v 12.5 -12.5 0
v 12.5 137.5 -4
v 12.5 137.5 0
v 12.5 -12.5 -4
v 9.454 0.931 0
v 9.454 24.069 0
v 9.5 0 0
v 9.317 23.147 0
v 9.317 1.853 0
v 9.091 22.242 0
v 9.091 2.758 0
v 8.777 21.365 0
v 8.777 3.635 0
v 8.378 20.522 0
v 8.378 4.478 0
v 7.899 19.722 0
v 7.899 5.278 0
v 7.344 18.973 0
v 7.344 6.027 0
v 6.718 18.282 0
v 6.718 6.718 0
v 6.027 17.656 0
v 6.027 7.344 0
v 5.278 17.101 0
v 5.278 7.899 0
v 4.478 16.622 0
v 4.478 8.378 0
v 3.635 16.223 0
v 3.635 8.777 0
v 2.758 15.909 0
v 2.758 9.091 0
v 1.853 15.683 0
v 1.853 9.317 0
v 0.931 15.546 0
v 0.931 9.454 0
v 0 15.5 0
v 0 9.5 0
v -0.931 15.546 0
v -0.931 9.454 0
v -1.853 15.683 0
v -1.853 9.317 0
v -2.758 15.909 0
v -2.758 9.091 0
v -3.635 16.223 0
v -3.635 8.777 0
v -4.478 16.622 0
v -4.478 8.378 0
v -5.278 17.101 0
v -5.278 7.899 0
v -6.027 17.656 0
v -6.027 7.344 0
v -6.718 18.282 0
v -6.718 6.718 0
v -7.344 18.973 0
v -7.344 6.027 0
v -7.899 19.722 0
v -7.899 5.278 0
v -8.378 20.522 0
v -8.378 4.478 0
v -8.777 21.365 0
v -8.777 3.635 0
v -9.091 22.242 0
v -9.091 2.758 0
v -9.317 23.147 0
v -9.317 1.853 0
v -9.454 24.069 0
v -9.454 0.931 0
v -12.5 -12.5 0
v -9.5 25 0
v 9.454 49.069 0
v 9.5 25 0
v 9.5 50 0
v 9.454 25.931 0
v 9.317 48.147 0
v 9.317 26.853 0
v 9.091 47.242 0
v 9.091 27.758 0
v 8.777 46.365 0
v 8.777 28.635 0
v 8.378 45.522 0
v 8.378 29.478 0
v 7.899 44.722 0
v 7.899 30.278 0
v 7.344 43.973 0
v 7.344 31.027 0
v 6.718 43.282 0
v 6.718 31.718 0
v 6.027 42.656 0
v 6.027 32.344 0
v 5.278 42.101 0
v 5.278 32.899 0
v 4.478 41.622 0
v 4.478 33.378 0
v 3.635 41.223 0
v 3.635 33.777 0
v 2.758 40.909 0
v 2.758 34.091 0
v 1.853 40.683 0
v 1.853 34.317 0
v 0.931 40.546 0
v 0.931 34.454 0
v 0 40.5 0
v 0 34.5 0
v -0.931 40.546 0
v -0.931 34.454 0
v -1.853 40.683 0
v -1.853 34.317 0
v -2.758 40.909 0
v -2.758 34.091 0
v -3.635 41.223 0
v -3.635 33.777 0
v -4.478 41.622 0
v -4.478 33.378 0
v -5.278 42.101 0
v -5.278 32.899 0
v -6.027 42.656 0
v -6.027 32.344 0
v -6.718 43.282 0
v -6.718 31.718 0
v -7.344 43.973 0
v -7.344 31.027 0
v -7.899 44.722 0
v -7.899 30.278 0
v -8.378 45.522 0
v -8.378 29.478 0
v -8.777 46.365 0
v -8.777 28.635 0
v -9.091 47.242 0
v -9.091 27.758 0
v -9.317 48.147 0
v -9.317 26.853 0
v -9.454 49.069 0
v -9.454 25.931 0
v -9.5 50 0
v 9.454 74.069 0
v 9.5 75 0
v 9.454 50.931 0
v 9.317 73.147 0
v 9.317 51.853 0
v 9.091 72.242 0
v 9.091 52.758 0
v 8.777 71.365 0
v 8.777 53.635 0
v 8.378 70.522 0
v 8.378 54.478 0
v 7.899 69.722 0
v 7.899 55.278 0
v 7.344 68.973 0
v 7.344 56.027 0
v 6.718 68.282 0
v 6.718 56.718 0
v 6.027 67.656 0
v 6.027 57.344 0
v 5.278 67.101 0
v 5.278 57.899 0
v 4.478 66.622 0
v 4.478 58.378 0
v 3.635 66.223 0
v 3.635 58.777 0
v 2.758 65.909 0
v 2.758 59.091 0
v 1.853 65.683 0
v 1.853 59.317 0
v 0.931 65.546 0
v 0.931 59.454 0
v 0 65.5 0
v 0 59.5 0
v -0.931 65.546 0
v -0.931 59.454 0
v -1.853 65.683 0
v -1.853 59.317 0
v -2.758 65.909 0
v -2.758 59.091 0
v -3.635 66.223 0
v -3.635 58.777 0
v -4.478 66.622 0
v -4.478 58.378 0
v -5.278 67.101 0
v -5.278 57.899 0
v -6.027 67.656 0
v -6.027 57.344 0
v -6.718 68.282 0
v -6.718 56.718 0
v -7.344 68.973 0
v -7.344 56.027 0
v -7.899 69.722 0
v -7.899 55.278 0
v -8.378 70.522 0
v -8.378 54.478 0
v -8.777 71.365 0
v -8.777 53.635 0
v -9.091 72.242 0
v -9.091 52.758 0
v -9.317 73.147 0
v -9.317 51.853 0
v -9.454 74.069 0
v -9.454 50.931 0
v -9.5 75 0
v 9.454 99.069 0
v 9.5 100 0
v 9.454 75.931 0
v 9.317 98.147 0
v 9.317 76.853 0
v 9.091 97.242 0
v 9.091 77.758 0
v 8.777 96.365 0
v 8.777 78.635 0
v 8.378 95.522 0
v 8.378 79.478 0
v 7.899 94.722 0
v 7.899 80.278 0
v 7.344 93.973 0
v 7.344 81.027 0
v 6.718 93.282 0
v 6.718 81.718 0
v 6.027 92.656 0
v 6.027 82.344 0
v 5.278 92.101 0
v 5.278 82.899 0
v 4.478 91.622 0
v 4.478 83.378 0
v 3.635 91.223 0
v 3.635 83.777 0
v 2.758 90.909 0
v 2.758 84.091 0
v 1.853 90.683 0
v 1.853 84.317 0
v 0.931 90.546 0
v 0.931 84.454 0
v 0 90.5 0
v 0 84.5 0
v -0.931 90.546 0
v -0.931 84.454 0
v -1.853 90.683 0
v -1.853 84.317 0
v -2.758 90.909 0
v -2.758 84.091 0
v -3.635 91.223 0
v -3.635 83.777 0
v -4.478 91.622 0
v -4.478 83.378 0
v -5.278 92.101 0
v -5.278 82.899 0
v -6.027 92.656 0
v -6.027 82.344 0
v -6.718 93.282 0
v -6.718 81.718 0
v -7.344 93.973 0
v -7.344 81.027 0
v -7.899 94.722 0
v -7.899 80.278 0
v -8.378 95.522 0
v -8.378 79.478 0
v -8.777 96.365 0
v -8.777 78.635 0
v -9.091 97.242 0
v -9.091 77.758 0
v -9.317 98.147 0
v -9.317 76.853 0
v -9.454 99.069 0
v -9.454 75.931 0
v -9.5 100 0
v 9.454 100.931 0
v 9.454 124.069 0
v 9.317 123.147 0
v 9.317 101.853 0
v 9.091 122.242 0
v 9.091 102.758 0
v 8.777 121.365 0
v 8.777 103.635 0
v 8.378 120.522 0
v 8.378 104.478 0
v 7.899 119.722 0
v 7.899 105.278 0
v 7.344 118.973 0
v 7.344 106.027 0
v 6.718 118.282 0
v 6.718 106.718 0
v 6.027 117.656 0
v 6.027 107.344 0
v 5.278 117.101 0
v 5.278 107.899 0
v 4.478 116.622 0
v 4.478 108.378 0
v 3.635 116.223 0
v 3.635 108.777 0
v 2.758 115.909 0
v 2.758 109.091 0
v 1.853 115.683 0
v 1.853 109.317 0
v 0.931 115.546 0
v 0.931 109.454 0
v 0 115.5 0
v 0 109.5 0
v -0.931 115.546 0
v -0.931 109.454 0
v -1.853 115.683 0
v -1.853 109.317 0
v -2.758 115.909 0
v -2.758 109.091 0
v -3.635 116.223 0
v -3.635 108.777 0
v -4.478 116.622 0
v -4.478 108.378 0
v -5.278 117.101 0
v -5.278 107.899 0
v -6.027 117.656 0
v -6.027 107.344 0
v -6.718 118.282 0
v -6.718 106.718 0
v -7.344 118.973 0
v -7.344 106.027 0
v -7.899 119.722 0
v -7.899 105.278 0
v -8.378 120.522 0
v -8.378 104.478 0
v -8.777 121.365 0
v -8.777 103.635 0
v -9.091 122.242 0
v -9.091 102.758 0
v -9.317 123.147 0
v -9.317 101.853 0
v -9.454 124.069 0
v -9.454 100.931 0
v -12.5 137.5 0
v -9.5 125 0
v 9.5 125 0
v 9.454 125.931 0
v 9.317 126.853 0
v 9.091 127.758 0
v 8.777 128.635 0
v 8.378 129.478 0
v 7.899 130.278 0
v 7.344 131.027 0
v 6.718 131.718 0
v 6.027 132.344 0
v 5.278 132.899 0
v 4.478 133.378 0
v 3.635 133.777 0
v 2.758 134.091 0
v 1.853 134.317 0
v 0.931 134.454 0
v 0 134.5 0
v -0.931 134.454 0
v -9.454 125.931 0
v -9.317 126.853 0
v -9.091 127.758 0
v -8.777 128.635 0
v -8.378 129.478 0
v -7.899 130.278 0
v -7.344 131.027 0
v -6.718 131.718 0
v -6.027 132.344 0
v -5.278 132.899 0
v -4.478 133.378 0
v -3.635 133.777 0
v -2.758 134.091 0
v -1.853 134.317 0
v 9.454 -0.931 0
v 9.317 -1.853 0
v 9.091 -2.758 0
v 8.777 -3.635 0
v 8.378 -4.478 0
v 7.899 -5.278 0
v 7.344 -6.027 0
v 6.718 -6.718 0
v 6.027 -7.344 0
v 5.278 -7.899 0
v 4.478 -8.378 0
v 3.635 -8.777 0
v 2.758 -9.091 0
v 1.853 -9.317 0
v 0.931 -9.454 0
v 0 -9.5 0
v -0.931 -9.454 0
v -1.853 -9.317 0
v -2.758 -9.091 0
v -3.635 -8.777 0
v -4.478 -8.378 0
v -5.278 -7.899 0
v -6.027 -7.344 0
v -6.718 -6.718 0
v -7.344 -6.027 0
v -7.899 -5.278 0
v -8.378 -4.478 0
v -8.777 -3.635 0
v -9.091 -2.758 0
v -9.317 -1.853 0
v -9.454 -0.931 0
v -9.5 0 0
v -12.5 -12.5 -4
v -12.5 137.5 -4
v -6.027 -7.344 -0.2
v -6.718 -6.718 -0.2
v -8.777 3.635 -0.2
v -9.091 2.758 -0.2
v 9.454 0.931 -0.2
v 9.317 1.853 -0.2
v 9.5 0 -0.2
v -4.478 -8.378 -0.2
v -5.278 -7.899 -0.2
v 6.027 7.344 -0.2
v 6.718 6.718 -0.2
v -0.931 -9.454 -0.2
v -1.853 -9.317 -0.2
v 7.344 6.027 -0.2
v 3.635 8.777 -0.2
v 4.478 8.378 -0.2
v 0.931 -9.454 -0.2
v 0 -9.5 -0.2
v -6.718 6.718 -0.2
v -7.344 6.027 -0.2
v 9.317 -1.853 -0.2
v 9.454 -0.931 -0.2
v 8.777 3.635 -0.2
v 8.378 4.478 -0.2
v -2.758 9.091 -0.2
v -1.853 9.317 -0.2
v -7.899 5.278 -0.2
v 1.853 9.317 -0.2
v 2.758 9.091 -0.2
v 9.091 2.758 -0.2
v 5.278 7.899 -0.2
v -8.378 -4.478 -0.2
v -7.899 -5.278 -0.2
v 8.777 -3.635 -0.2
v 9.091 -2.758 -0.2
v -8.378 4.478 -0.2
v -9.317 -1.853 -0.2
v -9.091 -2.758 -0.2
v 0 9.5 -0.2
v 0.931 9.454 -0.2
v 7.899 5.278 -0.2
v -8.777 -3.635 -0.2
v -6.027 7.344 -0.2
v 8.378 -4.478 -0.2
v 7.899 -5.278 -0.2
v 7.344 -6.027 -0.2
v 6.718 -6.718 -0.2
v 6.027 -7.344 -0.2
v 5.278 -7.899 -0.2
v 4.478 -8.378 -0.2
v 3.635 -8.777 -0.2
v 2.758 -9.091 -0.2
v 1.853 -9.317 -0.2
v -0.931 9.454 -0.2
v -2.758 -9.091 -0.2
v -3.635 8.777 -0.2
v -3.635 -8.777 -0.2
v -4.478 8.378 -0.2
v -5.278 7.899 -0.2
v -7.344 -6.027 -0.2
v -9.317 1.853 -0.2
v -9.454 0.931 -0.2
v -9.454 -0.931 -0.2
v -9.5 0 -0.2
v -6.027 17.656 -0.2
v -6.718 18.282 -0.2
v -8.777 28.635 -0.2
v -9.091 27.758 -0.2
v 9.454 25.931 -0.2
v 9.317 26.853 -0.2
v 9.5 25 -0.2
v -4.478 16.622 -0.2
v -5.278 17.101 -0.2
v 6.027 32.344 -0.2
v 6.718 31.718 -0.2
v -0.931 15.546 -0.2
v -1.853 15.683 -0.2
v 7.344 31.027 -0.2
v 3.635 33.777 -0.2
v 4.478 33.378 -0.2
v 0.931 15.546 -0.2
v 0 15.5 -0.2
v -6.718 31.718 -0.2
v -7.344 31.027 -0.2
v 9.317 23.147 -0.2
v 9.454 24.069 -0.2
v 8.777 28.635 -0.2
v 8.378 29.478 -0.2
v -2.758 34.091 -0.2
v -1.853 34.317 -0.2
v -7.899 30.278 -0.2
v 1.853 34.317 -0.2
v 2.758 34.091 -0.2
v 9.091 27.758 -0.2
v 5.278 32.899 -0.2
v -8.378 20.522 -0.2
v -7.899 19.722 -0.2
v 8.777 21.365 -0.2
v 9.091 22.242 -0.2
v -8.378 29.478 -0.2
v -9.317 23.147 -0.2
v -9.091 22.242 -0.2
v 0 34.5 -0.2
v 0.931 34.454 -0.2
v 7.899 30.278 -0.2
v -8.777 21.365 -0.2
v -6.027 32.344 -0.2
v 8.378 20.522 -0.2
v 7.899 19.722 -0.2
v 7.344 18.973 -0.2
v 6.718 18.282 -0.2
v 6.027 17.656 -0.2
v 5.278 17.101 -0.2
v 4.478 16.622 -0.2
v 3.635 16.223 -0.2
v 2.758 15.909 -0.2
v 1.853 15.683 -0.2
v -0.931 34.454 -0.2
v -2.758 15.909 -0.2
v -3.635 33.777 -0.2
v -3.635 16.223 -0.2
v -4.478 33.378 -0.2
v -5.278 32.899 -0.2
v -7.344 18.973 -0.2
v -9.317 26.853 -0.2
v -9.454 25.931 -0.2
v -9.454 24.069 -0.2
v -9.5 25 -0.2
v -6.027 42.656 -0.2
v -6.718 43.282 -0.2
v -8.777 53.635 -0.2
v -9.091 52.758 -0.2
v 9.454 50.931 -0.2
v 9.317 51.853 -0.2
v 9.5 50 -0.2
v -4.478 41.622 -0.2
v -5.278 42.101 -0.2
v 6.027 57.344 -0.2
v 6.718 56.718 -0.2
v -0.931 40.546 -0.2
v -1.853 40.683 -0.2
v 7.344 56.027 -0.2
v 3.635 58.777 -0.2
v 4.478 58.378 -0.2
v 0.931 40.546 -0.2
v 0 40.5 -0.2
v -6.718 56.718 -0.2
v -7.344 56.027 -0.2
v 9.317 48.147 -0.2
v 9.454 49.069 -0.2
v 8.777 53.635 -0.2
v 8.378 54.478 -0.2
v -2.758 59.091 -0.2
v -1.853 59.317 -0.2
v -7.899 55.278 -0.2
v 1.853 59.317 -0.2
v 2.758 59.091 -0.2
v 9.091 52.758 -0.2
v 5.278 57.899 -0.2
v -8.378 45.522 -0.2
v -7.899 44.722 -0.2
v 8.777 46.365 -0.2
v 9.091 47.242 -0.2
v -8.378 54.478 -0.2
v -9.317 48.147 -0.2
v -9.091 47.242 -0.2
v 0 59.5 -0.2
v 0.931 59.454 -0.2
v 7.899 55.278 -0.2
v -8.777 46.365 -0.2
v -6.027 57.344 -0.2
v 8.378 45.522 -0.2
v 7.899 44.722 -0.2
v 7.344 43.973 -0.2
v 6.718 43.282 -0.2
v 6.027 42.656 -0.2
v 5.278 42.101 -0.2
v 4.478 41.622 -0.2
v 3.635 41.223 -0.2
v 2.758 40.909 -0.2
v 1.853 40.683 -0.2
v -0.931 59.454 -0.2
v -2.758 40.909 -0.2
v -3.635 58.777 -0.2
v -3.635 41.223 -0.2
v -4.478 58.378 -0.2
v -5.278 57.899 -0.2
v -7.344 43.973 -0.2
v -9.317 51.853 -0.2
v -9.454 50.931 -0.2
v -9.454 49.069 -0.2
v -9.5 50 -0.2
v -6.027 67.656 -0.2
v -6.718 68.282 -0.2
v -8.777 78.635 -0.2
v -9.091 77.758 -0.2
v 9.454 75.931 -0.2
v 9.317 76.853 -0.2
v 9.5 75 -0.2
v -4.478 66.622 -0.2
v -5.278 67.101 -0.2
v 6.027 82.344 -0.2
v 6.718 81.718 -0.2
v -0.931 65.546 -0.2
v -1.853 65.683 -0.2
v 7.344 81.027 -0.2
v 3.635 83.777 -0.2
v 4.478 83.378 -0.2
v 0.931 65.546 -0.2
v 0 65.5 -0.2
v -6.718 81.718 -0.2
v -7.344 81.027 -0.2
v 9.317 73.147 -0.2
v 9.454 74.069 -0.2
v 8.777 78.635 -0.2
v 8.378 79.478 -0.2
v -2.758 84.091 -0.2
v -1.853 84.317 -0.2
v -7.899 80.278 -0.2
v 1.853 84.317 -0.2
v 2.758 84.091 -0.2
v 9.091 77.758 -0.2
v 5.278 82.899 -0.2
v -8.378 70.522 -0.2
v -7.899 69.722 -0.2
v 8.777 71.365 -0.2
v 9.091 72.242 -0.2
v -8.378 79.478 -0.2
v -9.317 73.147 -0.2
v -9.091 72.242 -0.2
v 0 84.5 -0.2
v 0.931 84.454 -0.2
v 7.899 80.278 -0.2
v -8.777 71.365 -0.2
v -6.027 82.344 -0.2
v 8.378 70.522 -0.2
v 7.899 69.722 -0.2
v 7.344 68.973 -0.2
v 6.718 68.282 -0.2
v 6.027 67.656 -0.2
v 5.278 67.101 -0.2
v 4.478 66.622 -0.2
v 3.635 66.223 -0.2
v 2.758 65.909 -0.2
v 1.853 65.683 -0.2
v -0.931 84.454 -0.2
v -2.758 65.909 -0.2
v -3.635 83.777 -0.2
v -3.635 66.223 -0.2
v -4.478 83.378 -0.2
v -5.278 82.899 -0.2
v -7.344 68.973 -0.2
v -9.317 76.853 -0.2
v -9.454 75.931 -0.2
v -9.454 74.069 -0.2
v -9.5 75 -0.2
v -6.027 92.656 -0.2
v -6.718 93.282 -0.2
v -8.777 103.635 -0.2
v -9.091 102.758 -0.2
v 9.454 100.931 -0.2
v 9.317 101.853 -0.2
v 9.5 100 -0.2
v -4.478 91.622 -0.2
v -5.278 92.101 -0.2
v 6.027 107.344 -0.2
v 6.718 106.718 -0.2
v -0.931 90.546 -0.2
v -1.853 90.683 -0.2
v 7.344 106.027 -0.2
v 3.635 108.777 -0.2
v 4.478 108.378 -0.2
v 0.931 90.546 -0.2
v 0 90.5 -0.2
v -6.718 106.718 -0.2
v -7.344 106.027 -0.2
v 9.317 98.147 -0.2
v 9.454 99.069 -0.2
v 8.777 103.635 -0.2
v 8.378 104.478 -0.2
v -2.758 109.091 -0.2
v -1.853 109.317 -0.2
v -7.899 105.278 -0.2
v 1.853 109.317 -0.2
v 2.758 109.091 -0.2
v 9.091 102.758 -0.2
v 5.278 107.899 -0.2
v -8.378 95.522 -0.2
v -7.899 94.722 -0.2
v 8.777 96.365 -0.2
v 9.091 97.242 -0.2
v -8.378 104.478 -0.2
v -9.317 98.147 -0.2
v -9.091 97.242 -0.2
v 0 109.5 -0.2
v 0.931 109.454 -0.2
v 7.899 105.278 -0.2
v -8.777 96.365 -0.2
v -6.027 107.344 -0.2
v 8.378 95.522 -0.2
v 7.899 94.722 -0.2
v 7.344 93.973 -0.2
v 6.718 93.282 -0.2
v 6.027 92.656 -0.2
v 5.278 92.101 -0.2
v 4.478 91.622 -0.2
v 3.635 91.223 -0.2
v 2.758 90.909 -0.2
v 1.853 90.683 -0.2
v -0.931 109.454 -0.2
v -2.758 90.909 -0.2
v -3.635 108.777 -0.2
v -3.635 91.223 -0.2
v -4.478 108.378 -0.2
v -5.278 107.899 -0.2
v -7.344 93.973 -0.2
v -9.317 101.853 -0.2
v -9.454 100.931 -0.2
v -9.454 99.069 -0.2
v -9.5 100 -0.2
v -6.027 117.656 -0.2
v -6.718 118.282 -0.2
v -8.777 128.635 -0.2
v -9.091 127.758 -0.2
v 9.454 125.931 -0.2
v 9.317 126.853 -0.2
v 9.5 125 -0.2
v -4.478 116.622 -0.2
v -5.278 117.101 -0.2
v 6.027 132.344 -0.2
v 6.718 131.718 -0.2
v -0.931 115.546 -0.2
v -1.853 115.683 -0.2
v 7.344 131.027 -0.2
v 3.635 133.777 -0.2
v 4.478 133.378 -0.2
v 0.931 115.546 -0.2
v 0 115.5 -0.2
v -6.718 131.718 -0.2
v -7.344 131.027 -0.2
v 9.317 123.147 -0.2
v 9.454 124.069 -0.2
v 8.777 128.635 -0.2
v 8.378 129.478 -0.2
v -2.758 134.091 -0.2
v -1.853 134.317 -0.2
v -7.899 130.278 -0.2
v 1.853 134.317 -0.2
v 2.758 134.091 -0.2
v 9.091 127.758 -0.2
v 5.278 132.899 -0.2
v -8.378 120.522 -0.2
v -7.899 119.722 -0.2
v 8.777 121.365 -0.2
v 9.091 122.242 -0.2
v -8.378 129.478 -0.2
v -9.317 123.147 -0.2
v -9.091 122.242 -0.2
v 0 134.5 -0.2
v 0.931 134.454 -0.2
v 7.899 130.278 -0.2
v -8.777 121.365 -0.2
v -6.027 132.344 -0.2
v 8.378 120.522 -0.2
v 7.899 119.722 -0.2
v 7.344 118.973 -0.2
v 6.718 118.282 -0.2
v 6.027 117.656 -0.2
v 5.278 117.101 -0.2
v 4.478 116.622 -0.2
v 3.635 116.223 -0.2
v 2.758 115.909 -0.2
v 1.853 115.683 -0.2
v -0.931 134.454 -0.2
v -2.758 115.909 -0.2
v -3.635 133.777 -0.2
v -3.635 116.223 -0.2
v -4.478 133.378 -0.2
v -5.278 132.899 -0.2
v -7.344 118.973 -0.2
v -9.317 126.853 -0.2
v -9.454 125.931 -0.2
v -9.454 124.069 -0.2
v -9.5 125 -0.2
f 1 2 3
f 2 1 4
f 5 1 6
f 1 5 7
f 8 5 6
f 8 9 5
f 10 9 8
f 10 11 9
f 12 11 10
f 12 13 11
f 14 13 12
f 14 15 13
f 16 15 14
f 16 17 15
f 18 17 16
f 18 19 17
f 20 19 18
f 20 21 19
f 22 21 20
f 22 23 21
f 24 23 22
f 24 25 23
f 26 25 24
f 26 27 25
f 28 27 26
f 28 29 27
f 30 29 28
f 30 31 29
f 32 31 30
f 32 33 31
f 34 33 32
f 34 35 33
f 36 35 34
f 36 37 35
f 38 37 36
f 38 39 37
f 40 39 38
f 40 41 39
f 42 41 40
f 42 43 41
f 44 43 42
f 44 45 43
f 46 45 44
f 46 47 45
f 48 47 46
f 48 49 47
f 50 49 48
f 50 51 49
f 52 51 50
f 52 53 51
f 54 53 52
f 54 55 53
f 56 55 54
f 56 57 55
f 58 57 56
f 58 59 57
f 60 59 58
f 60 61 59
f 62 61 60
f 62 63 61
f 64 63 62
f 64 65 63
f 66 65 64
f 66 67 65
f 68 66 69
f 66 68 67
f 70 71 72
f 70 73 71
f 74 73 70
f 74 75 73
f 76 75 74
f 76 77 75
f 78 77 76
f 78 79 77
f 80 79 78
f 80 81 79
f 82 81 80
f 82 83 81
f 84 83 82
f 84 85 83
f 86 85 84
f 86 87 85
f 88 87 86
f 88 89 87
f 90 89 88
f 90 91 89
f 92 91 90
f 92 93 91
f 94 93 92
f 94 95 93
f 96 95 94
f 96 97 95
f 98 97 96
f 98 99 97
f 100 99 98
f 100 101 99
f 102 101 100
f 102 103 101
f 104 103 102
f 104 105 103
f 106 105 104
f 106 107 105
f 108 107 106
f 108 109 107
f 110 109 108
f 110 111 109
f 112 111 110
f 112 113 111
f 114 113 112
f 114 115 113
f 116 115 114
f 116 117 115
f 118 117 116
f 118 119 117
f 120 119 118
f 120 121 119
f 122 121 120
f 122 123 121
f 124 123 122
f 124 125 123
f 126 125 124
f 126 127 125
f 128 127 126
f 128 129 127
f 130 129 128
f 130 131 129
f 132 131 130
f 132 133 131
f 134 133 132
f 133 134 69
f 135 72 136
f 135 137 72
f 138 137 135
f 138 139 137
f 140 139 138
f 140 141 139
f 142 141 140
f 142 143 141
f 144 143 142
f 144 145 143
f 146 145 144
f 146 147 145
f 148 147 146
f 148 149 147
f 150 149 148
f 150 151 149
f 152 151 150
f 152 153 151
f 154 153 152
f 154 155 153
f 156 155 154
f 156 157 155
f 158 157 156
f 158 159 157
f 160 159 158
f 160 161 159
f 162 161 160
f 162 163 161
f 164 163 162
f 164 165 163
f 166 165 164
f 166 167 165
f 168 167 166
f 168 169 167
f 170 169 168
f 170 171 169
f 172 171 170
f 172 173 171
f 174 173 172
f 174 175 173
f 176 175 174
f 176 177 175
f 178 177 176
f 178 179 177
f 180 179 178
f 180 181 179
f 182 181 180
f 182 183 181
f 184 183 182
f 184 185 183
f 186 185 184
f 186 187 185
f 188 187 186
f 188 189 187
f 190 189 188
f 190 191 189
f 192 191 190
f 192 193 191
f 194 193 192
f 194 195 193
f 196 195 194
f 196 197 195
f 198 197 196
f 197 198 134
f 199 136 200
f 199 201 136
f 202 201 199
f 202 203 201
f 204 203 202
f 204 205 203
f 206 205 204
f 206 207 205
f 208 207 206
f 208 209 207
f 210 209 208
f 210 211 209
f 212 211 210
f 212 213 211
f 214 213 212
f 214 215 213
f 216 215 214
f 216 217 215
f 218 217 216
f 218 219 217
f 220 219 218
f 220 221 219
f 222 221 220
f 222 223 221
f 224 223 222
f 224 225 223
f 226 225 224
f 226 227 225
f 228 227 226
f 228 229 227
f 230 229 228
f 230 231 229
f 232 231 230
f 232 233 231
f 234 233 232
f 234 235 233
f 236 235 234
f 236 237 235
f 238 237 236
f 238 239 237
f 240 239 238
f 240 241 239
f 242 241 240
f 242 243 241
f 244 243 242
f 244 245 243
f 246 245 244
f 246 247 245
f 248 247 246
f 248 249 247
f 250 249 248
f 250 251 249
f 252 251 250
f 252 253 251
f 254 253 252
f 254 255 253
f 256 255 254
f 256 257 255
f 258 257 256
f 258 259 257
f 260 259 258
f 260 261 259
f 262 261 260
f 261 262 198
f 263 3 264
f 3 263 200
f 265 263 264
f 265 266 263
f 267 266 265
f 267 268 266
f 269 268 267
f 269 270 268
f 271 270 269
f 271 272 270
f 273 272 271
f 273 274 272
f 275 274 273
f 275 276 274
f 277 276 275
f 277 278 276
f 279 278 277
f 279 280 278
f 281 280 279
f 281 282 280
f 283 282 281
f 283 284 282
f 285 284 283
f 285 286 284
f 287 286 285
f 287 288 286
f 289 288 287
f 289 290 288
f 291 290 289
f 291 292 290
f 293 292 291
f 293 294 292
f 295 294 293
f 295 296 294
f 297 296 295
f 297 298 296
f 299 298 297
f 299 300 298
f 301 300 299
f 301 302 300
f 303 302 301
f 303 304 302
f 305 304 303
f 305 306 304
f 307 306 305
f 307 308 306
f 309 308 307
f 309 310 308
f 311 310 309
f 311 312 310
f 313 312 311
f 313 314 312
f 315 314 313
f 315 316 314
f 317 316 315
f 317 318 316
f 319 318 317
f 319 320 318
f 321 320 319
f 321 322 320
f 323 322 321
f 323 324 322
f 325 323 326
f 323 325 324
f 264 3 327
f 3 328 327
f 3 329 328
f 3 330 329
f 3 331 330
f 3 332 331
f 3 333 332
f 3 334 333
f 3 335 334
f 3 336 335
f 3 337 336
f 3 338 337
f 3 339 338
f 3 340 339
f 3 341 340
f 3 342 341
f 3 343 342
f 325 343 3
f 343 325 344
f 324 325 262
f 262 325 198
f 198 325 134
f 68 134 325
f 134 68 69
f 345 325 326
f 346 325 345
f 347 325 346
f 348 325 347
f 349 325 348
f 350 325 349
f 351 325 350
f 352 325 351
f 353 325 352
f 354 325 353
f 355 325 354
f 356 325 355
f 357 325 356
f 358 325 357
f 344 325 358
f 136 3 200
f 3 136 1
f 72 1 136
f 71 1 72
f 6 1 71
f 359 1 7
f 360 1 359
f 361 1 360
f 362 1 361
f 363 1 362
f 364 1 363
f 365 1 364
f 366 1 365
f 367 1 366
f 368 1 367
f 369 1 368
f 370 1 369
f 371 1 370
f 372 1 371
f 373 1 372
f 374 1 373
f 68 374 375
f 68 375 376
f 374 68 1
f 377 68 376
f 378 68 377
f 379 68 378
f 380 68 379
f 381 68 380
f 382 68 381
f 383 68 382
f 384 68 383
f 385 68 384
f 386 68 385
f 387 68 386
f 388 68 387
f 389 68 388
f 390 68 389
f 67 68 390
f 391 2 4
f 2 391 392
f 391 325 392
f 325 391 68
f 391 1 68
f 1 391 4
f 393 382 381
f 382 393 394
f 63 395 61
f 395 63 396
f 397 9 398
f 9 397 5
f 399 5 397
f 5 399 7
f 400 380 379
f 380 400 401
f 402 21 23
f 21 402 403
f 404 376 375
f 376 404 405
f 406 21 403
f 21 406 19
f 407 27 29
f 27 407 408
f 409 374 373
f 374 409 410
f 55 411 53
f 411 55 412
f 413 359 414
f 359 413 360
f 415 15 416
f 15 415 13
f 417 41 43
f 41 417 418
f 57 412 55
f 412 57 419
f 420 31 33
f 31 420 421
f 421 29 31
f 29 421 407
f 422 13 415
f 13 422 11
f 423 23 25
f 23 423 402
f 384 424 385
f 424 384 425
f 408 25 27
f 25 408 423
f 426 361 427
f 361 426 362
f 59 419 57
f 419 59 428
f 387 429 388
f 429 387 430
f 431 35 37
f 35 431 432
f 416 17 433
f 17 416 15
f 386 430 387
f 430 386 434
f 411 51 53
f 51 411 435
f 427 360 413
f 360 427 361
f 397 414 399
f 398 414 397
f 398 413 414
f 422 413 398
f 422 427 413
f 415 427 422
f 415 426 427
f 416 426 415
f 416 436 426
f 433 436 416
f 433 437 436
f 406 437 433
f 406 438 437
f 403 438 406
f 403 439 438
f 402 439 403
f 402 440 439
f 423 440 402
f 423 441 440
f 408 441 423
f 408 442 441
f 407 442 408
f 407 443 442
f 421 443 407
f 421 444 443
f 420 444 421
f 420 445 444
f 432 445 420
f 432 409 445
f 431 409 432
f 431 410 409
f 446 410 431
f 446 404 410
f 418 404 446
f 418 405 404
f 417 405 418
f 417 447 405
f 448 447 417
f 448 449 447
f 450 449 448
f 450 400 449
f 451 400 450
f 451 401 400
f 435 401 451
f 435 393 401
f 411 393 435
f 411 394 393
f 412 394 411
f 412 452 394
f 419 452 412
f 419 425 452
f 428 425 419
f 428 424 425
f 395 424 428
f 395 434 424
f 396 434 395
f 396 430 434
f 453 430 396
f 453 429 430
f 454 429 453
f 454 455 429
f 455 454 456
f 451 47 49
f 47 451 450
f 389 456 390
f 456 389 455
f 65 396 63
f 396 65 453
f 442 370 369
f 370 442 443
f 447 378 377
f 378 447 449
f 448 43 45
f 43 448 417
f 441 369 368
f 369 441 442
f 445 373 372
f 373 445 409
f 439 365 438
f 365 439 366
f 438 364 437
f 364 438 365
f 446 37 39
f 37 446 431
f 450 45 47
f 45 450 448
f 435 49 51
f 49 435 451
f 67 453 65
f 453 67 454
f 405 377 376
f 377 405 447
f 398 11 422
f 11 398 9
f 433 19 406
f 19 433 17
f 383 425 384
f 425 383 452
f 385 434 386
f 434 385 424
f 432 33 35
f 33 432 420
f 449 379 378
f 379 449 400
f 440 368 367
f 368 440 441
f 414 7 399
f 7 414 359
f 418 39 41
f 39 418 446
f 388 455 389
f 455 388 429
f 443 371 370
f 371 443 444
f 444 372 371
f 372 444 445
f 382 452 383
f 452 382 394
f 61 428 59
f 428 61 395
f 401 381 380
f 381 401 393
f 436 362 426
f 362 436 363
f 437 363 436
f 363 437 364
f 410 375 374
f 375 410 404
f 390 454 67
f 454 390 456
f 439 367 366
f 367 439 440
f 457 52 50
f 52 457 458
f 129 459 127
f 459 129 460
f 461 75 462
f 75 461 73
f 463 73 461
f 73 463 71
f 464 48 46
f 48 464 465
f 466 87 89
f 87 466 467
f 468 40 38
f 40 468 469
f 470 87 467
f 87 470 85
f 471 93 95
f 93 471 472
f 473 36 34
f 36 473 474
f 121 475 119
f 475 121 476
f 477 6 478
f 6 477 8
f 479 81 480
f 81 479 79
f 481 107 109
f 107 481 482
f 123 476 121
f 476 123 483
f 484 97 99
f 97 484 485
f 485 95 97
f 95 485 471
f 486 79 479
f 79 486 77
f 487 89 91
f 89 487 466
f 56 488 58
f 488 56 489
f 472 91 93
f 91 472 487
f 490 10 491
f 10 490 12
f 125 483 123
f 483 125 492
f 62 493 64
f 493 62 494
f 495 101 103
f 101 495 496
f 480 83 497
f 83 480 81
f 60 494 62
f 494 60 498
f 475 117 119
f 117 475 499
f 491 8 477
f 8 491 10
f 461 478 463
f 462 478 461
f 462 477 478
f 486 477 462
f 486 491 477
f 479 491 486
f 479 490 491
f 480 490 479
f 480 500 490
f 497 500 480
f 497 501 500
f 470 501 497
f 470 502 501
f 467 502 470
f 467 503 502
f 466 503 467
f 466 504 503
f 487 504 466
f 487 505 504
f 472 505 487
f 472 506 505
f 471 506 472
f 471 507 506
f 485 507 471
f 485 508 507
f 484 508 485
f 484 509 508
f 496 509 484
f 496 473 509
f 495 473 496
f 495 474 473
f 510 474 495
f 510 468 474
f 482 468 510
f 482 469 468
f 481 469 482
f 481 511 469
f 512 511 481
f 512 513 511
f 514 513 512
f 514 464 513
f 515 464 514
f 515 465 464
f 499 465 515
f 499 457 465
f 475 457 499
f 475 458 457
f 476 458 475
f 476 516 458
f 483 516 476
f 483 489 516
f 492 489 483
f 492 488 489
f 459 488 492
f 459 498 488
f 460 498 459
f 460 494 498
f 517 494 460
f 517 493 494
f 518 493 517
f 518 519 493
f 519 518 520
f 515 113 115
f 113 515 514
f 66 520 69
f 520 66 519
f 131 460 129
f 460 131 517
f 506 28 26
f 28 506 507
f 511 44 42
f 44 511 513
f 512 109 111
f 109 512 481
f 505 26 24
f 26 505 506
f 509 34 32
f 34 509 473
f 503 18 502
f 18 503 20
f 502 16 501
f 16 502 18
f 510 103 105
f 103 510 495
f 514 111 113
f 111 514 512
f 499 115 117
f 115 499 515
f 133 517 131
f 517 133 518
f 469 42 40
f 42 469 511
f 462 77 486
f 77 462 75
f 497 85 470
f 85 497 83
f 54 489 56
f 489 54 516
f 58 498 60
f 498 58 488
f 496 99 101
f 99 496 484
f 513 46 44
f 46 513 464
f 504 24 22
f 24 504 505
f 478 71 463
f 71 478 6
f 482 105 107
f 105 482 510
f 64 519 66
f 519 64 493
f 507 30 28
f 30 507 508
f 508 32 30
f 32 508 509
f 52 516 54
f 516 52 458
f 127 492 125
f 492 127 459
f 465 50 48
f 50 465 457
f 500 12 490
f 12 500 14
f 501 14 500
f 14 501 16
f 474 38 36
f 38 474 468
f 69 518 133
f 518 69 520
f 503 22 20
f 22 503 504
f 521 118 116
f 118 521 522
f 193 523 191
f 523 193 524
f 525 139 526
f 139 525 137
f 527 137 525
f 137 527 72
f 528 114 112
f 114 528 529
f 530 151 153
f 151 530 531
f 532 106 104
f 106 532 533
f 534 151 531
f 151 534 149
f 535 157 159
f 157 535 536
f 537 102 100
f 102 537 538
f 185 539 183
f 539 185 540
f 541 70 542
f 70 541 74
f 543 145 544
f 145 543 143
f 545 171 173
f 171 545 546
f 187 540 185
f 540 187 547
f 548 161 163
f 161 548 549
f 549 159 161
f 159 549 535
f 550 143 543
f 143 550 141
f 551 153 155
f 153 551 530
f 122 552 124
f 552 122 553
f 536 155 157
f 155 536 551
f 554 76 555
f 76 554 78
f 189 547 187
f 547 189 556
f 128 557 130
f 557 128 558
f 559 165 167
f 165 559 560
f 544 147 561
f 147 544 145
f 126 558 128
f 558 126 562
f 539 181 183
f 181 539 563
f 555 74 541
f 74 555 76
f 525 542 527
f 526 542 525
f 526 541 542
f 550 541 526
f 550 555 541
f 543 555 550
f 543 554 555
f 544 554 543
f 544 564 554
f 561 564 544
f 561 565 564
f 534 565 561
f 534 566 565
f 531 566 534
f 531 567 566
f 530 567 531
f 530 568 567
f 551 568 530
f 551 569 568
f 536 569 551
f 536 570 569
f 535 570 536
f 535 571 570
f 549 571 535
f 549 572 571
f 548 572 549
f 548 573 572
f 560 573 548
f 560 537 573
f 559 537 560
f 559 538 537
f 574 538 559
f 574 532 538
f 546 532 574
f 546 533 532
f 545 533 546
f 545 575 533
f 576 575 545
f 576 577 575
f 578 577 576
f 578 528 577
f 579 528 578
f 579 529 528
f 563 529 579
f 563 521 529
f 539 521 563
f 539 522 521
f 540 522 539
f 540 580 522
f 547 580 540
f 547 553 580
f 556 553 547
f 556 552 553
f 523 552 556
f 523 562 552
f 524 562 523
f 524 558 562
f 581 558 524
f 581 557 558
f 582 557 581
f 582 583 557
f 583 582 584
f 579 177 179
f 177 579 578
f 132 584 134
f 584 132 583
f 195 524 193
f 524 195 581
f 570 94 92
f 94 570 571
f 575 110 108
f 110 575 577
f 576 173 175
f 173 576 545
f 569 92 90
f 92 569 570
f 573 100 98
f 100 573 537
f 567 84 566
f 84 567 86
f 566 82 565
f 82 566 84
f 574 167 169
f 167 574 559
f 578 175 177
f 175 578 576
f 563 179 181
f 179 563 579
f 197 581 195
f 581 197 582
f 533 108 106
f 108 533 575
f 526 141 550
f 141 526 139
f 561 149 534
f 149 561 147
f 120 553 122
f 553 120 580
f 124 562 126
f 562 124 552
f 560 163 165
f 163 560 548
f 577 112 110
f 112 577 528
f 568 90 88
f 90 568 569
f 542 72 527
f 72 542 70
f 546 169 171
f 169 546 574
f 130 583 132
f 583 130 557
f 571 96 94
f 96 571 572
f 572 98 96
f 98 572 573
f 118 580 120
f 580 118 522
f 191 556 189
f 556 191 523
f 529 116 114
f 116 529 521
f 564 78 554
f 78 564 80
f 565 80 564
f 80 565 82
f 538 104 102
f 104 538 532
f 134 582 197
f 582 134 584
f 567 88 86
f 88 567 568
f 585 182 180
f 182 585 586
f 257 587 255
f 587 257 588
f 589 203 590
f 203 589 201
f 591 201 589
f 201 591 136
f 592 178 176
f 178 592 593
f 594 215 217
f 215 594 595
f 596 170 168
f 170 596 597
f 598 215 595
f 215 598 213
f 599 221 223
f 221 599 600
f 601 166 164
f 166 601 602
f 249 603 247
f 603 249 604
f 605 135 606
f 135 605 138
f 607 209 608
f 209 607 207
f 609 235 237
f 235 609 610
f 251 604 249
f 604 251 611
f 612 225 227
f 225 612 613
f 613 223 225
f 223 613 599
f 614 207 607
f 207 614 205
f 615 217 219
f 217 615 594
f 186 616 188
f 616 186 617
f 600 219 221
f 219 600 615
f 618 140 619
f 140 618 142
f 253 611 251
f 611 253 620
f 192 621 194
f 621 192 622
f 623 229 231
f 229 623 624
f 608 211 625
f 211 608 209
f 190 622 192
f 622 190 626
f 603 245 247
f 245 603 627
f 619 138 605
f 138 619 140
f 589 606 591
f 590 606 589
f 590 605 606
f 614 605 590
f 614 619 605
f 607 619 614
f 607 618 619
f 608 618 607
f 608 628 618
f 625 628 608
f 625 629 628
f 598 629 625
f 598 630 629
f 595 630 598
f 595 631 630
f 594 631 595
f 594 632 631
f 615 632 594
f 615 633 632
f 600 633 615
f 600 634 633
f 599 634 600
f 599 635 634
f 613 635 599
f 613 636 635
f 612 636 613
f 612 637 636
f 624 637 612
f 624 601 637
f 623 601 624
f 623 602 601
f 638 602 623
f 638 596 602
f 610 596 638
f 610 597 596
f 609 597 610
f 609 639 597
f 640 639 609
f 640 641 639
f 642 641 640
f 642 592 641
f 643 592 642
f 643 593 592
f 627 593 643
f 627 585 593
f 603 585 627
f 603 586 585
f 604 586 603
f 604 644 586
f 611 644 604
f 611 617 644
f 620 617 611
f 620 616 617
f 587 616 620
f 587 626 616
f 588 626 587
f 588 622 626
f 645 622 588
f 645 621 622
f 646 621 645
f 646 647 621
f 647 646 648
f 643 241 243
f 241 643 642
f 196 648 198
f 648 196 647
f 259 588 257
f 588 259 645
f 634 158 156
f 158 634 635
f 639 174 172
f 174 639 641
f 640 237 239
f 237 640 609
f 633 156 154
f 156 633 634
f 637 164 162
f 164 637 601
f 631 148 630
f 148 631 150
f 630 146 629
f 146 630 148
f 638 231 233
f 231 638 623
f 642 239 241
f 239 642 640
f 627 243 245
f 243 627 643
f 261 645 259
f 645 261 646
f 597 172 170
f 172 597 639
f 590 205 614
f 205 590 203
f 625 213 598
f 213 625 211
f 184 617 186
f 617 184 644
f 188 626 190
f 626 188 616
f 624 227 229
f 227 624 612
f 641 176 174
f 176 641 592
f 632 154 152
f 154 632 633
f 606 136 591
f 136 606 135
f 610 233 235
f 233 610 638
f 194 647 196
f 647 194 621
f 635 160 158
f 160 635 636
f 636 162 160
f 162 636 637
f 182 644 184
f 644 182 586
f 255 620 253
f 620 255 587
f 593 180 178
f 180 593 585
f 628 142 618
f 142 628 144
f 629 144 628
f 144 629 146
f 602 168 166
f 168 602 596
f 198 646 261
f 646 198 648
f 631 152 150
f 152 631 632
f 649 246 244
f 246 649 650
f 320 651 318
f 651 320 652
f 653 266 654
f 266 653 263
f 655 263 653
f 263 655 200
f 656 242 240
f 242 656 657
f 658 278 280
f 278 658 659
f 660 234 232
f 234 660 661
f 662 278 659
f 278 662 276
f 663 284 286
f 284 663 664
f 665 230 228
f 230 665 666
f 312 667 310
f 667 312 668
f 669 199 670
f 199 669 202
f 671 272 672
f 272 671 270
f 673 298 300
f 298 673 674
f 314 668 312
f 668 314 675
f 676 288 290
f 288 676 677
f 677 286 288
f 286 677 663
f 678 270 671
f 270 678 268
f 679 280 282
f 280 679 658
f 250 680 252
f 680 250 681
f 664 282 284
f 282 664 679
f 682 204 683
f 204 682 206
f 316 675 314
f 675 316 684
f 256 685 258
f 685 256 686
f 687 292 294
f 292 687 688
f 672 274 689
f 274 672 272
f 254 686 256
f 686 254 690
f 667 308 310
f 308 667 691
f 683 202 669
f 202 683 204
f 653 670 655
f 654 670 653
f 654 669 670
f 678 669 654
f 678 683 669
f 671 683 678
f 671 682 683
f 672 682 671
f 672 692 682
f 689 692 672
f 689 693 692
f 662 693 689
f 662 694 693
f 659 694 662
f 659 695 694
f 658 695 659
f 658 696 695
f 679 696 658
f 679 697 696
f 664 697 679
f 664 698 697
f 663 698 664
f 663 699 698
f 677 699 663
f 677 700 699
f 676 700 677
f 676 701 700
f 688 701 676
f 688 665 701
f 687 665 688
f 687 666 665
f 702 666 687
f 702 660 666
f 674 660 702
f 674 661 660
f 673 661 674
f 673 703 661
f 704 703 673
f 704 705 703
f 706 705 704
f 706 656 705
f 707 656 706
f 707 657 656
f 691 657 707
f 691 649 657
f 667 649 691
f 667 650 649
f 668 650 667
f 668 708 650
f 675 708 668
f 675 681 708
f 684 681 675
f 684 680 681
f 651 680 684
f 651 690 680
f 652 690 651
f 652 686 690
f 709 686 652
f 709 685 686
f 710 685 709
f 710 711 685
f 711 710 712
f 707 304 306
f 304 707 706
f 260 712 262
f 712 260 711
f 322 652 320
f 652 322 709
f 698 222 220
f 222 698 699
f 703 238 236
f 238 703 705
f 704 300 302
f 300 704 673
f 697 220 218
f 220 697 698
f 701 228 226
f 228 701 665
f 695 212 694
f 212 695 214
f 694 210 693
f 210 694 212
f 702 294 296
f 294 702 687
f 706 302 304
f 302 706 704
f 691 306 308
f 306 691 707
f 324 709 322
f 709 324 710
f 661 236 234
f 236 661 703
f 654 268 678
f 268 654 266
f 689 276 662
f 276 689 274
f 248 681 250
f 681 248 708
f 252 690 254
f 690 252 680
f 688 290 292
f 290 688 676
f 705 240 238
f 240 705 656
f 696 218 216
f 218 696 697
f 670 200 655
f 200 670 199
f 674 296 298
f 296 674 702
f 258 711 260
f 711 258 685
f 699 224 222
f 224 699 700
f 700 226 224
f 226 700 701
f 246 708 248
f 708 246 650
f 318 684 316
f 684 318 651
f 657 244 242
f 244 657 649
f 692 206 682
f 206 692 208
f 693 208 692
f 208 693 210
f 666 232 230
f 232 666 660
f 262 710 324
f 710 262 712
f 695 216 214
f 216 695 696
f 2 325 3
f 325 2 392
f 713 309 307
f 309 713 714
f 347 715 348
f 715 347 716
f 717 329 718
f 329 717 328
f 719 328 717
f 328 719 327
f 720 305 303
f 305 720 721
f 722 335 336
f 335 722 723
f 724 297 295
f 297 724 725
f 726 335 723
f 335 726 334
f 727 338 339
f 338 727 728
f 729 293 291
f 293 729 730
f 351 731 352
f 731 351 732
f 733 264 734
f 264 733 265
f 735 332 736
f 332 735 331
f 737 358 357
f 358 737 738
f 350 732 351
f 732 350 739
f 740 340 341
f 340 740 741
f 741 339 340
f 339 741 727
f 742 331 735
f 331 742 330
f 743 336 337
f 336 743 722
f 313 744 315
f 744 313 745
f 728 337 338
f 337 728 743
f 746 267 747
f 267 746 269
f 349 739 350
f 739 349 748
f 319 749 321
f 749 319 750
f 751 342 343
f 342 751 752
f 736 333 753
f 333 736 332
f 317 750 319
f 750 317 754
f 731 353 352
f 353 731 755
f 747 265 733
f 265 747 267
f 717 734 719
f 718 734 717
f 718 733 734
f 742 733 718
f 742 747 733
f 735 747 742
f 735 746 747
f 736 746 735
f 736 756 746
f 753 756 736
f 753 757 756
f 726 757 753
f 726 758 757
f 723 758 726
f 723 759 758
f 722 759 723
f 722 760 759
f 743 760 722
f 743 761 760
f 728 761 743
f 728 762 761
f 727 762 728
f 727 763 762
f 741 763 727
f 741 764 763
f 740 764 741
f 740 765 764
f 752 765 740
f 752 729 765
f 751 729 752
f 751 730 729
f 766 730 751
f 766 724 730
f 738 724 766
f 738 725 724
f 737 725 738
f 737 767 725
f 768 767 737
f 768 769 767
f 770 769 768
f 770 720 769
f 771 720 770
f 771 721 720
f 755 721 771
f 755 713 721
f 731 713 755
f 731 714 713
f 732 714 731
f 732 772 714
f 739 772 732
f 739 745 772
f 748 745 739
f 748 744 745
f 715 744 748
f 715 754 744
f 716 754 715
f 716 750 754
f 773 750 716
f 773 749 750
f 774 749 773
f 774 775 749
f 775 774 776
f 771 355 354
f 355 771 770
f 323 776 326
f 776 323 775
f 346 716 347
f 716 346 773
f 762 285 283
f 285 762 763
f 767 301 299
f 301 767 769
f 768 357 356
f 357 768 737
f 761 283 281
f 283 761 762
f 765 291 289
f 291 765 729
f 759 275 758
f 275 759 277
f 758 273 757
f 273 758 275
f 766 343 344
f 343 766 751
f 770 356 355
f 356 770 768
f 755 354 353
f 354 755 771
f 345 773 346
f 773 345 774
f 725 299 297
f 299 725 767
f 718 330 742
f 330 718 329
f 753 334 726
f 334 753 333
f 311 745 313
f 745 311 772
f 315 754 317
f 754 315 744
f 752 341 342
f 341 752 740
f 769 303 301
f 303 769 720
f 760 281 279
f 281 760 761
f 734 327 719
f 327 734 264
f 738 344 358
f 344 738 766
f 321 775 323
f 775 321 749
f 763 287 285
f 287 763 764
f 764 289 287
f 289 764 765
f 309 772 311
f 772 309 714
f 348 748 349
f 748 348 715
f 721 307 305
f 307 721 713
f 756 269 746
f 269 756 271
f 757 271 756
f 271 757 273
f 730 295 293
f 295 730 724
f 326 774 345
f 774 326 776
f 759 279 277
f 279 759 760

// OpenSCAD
// Generated by SolidPython 1.1.3 on 2024-01-10 10:53:05


union() {
	translate(v = [0, 0, 0.0000000000]) {
		difference() {
			translate(v = [0, 0, -2.0000000000]) {
				cube(center = true, size = [25, 25, 4]);
			}
			translate(v = [0, 0, -0.1000000000]) {
				cylinder($fn = 64, center = true, h = 0.2000000000, r = 9.5000000000);
			}
		}
	}
	translate(v = [0, 25, 0.0000000000]) {
		difference() {
			translate(v = [0, 0, -2.0000000000]) {
				cube(center = true, size = [25, 25, 4]);
			}
			translate(v = [0, 0, -0.1000000000]) {
				cylinder($fn = 64, center = true, h = 0.2000000000, r = 9.5000000000);
			}
		}
	}
	translate(v = [0, 50, 0.0000000000]) {
		difference() {
			translate(v = [0, 0, -2.0000000000]) {
				cube(center = true, size = [25, 25, 4]);
			}
			translate(v = [0, 0, -0.1000000000]) {
				cylinder($fn = 64, center = true, h = 0.2000000000, r = 9.5000000000);
			}
		}
	}
	translate(v = [0, 75, 0.0000000000]) {
		difference() {
			translate(v = [0, 0, -2.0000000000]) {
				cube(center = true, size = [25, 25, 4]);
			}
			translate(v = [0, 0, -0.1000000000]) {
				cylinder($fn = 64, center = true, h = 0.2000000000, r = 9.5000000000);
			}
		}
	}
	translate(v = [0, 100, 0.0000000000]) {
		difference() {
			translate(v = [0, 0, -2.0000000000]) {
				cube(center = true, size = [25, 25, 4]);
			}
			translate(v = [0, 0, -0.1000000000]) {
				cylinder($fn = 64, center = true, h = 0.2000000000, r = 9.5000000000);
			}
		}
	}
	translate(v = [0, 125, 0.0000000000]) {
		difference() {
			translate(v = [0, 0, -2.0000000000]) {
				cube(center = true, size = [25, 25, 4]);
			}
			translate(v = [0, 0, -0.1000000000]) {
				cylinder($fn = 64, center = true, h = 0.2000000000, r = 9.5000000000);
			}
		}
	}
}
/***********************************************
*********      SolidPython code:      **********
************************************************
 
import solid
import os
import os.path as osp
from make_device import make_unit_array

def save_model(model,base_path,base_name):
    if not osp.exists(base_path):
        os.makedirs(base_path)
    scad_path=osp.join(base_path,base_name+".scad")
    solid.scad_render_to_file(model,osp.join(scad_path))


def create_rack(item_diameter,item_thickness,rack_height,base_name,base_path,item_diameter_extra=0,item_thickness_extra=0,rack_size_extra=0,grid_size=[1,1]):
    holder_size=(item_diameter+item_diameter_extra+rack_size_extra,item_diameter+item_diameter_extra+rack_size_extra)
    dims = [*holder_size, 0]
    height= item_thickness+item_thickness_extra
    radius=(item_diameter+item_diameter_extra)/2.0
    hole = solid.cylinder(r=radius, h=height, segments=64, center = True)
    hole = solid.translate([0,0,-height/2.0])(hole)
    holder = solid.cube((*holder_size,rack_height), center = True)
    holder = solid.translate([0,0,-rack_height/2.0])(holder)
    holder = solid.difference()(holder,hole)
    holder=make_unit_array(holder,dims,grid_size)
    save_model(holder,base_path,base_name)

version="v3"
base_path="./designs/plasma_racks/4mm_well_0.5inch_diam_device_"+version+"/"
#coverslip glass holder
item_diameter=18
item_diameter_extra=1
item_thickness=0.16
item_thickness_extra=0.04
rack_height=4
rack_size_extra=6
base_name="18CIR-1_rack_"+version
grid_size=[1,6]
create_rack(item_diameter,item_thickness,rack_height,base_name,base_path,item_diameter_extra=item_diameter_extra,item_thickness_extra=item_thickness_extra,rack_size_extra=rack_size_extra,grid_size=grid_size)

#0.5" diam device holder
item_diameter=15.8
item_diameter_extra=0
item_thickness=3
item_thickness_extra=0
rack_height=6
rack_size_extra=6
base_name="0.5inch_4mm_device_rack_"+version
grid_size=[1,6]
create_rack(item_diameter,item_thickness,rack_height,base_name,base_path,item_diameter_extra=item_diameter_extra,item_thickness_extra=item_thickness_extra,rack_size_extra=rack_size_extra,grid_size=grid_size)

 
 
************************************************/
